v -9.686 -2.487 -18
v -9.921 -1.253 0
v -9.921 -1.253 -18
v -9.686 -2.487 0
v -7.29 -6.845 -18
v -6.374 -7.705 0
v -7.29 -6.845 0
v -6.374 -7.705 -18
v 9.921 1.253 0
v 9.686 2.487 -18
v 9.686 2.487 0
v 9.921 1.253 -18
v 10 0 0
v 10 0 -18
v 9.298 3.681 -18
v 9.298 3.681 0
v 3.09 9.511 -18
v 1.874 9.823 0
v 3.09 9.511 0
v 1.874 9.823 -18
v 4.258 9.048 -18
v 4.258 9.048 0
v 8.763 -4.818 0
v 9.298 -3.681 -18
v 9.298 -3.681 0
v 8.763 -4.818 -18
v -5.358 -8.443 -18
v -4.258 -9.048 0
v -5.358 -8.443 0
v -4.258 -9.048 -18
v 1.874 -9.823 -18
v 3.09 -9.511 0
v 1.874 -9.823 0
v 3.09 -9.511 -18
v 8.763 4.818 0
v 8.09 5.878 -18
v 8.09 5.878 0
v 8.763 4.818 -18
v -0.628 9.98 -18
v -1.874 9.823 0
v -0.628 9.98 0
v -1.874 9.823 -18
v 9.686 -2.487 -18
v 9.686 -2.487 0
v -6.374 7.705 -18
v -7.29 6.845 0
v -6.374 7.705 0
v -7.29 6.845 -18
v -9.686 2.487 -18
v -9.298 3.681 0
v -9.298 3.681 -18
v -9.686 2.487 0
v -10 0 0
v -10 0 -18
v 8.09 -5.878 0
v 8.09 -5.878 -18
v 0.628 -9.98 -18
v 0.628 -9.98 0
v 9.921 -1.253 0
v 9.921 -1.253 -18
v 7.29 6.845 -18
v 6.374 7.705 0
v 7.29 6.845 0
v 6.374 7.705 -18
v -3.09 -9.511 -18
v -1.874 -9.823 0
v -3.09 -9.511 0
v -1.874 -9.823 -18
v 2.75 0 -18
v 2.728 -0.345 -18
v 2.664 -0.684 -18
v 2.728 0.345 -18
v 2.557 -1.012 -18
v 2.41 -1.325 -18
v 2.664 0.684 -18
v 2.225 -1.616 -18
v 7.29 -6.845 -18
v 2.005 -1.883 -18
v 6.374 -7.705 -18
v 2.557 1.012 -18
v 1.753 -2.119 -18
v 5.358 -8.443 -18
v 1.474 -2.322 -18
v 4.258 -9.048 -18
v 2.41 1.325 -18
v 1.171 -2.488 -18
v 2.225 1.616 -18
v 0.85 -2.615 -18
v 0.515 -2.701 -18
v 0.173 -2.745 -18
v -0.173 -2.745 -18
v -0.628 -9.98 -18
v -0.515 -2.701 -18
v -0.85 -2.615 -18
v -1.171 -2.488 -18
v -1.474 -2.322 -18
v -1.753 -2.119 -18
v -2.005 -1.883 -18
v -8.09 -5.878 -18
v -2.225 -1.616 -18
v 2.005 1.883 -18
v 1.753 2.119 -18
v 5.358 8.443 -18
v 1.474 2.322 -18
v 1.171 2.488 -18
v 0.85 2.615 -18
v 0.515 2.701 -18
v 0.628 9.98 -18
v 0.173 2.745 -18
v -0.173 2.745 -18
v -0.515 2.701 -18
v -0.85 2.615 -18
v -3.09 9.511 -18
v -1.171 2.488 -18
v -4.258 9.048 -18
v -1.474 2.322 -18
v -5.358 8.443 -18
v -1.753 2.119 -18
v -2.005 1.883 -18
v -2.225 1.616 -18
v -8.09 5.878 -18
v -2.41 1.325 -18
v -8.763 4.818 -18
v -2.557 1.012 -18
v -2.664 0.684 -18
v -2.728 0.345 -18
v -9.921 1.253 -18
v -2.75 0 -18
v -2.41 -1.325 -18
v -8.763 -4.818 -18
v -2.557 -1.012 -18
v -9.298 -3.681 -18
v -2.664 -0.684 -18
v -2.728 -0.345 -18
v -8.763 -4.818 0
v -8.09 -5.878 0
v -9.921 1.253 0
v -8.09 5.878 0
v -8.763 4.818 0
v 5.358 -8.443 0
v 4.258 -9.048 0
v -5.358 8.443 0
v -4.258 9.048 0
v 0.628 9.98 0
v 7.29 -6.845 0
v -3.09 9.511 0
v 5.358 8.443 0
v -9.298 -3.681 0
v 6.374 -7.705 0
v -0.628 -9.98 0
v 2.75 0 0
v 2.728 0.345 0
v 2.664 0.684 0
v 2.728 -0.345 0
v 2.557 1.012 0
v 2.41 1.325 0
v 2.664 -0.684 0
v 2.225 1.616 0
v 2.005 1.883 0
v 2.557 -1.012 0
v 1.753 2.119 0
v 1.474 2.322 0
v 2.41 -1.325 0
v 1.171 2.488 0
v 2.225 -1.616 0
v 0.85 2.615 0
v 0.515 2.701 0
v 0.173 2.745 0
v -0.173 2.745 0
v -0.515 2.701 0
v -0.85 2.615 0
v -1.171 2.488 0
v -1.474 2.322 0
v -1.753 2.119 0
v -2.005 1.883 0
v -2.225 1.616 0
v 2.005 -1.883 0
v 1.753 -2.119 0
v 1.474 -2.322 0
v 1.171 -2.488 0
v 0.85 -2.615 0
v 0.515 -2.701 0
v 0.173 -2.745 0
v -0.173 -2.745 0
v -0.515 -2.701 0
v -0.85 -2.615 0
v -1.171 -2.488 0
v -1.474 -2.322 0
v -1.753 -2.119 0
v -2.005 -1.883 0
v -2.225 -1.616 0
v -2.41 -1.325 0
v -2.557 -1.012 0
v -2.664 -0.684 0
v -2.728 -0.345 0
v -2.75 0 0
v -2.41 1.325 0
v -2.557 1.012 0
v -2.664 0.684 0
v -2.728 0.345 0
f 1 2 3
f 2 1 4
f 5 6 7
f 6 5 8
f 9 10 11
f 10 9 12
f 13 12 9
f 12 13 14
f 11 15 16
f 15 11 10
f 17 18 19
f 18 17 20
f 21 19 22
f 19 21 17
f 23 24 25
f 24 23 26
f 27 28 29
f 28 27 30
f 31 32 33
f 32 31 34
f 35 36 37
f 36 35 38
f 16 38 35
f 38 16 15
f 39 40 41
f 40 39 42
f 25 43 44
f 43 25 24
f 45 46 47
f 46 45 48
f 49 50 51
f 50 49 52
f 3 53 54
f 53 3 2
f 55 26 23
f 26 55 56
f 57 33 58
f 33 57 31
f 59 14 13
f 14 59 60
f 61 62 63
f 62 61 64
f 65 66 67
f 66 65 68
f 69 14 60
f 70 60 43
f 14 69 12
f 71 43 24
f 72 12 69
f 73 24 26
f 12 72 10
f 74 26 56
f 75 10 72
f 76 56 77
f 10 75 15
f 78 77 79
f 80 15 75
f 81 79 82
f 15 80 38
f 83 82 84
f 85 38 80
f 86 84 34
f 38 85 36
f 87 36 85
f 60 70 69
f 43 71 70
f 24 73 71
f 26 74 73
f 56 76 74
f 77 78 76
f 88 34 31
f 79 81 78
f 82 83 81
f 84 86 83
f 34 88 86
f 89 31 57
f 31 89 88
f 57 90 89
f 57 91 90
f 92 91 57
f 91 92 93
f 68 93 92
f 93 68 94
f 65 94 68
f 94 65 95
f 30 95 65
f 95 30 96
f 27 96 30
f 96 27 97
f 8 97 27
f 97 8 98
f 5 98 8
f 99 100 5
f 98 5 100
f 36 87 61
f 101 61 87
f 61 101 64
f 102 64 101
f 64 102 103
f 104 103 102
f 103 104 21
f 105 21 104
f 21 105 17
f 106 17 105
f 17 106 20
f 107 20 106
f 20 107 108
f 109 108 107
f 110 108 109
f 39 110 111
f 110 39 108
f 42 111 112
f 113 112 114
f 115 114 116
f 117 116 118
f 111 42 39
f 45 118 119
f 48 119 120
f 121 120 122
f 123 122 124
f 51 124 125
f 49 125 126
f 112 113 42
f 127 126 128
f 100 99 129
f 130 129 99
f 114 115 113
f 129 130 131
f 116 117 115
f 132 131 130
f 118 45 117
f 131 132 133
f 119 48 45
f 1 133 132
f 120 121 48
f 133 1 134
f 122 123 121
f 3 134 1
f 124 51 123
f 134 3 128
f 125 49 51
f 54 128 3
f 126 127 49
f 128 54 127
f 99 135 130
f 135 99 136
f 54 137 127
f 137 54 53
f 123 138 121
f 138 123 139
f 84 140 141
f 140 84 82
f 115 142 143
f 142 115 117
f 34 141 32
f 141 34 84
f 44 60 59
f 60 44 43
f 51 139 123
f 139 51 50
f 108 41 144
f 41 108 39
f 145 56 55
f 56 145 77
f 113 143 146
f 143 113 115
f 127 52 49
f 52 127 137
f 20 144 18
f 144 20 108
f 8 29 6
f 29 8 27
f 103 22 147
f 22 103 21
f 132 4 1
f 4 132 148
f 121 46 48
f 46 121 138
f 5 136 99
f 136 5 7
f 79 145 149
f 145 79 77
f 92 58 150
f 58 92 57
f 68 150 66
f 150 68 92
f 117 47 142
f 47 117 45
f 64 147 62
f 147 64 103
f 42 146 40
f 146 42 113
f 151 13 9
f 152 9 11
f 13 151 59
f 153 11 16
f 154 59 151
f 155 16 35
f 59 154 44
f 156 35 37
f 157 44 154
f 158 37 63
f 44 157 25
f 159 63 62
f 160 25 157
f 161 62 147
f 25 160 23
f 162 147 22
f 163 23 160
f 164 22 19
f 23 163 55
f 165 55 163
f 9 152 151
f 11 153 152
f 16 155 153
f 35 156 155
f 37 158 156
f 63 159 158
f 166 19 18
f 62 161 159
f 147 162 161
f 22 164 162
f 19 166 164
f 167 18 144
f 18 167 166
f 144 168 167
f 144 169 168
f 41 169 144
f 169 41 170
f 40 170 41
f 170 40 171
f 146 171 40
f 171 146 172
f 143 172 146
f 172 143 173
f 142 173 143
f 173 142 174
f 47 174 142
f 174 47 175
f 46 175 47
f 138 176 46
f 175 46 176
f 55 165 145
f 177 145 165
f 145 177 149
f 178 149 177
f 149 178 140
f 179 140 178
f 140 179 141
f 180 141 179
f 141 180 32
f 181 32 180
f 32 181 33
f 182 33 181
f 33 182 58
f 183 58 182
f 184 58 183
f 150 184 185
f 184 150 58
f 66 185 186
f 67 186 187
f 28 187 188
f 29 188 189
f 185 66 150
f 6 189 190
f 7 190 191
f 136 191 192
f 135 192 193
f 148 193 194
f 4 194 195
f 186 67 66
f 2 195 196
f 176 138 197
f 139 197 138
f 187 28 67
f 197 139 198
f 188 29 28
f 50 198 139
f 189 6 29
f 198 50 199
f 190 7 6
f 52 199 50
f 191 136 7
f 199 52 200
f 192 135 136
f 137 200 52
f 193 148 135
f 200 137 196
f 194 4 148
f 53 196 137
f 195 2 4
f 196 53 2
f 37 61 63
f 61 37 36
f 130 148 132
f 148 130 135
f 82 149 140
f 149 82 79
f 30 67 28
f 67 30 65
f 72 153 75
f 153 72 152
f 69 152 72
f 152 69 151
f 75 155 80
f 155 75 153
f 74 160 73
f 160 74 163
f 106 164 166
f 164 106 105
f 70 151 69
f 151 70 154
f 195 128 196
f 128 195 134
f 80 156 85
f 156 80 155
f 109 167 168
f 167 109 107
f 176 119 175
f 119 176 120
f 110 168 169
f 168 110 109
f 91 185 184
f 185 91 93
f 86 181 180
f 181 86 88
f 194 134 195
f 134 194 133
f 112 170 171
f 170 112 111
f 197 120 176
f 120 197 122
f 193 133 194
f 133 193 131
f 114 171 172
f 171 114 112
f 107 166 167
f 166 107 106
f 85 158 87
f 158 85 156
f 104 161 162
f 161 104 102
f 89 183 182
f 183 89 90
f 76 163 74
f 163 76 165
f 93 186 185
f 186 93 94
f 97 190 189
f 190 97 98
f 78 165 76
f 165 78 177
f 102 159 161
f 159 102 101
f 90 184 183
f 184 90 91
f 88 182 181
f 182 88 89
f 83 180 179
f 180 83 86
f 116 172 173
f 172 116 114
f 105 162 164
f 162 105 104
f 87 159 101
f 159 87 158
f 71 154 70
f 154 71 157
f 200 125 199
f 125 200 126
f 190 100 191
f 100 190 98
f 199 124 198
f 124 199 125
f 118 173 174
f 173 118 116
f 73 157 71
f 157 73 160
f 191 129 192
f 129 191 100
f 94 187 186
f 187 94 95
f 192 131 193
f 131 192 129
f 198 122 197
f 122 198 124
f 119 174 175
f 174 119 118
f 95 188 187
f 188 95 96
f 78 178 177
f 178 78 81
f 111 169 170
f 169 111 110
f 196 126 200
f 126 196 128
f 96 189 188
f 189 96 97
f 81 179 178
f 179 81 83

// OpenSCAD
$fn = 50;


difference() {
	union() {
		translate(v = [0, 0, -18.0000000000]) {
			cylinder(h = 18, r = 10.0000000000);
		}
		cylinder(h = 0, r = 20.0000000000);
	}
	union() {
		#translate(v = [0, 0, -18]) {
			cylinder(h = 18, r = 2.7500000000);
		}
	}
}
